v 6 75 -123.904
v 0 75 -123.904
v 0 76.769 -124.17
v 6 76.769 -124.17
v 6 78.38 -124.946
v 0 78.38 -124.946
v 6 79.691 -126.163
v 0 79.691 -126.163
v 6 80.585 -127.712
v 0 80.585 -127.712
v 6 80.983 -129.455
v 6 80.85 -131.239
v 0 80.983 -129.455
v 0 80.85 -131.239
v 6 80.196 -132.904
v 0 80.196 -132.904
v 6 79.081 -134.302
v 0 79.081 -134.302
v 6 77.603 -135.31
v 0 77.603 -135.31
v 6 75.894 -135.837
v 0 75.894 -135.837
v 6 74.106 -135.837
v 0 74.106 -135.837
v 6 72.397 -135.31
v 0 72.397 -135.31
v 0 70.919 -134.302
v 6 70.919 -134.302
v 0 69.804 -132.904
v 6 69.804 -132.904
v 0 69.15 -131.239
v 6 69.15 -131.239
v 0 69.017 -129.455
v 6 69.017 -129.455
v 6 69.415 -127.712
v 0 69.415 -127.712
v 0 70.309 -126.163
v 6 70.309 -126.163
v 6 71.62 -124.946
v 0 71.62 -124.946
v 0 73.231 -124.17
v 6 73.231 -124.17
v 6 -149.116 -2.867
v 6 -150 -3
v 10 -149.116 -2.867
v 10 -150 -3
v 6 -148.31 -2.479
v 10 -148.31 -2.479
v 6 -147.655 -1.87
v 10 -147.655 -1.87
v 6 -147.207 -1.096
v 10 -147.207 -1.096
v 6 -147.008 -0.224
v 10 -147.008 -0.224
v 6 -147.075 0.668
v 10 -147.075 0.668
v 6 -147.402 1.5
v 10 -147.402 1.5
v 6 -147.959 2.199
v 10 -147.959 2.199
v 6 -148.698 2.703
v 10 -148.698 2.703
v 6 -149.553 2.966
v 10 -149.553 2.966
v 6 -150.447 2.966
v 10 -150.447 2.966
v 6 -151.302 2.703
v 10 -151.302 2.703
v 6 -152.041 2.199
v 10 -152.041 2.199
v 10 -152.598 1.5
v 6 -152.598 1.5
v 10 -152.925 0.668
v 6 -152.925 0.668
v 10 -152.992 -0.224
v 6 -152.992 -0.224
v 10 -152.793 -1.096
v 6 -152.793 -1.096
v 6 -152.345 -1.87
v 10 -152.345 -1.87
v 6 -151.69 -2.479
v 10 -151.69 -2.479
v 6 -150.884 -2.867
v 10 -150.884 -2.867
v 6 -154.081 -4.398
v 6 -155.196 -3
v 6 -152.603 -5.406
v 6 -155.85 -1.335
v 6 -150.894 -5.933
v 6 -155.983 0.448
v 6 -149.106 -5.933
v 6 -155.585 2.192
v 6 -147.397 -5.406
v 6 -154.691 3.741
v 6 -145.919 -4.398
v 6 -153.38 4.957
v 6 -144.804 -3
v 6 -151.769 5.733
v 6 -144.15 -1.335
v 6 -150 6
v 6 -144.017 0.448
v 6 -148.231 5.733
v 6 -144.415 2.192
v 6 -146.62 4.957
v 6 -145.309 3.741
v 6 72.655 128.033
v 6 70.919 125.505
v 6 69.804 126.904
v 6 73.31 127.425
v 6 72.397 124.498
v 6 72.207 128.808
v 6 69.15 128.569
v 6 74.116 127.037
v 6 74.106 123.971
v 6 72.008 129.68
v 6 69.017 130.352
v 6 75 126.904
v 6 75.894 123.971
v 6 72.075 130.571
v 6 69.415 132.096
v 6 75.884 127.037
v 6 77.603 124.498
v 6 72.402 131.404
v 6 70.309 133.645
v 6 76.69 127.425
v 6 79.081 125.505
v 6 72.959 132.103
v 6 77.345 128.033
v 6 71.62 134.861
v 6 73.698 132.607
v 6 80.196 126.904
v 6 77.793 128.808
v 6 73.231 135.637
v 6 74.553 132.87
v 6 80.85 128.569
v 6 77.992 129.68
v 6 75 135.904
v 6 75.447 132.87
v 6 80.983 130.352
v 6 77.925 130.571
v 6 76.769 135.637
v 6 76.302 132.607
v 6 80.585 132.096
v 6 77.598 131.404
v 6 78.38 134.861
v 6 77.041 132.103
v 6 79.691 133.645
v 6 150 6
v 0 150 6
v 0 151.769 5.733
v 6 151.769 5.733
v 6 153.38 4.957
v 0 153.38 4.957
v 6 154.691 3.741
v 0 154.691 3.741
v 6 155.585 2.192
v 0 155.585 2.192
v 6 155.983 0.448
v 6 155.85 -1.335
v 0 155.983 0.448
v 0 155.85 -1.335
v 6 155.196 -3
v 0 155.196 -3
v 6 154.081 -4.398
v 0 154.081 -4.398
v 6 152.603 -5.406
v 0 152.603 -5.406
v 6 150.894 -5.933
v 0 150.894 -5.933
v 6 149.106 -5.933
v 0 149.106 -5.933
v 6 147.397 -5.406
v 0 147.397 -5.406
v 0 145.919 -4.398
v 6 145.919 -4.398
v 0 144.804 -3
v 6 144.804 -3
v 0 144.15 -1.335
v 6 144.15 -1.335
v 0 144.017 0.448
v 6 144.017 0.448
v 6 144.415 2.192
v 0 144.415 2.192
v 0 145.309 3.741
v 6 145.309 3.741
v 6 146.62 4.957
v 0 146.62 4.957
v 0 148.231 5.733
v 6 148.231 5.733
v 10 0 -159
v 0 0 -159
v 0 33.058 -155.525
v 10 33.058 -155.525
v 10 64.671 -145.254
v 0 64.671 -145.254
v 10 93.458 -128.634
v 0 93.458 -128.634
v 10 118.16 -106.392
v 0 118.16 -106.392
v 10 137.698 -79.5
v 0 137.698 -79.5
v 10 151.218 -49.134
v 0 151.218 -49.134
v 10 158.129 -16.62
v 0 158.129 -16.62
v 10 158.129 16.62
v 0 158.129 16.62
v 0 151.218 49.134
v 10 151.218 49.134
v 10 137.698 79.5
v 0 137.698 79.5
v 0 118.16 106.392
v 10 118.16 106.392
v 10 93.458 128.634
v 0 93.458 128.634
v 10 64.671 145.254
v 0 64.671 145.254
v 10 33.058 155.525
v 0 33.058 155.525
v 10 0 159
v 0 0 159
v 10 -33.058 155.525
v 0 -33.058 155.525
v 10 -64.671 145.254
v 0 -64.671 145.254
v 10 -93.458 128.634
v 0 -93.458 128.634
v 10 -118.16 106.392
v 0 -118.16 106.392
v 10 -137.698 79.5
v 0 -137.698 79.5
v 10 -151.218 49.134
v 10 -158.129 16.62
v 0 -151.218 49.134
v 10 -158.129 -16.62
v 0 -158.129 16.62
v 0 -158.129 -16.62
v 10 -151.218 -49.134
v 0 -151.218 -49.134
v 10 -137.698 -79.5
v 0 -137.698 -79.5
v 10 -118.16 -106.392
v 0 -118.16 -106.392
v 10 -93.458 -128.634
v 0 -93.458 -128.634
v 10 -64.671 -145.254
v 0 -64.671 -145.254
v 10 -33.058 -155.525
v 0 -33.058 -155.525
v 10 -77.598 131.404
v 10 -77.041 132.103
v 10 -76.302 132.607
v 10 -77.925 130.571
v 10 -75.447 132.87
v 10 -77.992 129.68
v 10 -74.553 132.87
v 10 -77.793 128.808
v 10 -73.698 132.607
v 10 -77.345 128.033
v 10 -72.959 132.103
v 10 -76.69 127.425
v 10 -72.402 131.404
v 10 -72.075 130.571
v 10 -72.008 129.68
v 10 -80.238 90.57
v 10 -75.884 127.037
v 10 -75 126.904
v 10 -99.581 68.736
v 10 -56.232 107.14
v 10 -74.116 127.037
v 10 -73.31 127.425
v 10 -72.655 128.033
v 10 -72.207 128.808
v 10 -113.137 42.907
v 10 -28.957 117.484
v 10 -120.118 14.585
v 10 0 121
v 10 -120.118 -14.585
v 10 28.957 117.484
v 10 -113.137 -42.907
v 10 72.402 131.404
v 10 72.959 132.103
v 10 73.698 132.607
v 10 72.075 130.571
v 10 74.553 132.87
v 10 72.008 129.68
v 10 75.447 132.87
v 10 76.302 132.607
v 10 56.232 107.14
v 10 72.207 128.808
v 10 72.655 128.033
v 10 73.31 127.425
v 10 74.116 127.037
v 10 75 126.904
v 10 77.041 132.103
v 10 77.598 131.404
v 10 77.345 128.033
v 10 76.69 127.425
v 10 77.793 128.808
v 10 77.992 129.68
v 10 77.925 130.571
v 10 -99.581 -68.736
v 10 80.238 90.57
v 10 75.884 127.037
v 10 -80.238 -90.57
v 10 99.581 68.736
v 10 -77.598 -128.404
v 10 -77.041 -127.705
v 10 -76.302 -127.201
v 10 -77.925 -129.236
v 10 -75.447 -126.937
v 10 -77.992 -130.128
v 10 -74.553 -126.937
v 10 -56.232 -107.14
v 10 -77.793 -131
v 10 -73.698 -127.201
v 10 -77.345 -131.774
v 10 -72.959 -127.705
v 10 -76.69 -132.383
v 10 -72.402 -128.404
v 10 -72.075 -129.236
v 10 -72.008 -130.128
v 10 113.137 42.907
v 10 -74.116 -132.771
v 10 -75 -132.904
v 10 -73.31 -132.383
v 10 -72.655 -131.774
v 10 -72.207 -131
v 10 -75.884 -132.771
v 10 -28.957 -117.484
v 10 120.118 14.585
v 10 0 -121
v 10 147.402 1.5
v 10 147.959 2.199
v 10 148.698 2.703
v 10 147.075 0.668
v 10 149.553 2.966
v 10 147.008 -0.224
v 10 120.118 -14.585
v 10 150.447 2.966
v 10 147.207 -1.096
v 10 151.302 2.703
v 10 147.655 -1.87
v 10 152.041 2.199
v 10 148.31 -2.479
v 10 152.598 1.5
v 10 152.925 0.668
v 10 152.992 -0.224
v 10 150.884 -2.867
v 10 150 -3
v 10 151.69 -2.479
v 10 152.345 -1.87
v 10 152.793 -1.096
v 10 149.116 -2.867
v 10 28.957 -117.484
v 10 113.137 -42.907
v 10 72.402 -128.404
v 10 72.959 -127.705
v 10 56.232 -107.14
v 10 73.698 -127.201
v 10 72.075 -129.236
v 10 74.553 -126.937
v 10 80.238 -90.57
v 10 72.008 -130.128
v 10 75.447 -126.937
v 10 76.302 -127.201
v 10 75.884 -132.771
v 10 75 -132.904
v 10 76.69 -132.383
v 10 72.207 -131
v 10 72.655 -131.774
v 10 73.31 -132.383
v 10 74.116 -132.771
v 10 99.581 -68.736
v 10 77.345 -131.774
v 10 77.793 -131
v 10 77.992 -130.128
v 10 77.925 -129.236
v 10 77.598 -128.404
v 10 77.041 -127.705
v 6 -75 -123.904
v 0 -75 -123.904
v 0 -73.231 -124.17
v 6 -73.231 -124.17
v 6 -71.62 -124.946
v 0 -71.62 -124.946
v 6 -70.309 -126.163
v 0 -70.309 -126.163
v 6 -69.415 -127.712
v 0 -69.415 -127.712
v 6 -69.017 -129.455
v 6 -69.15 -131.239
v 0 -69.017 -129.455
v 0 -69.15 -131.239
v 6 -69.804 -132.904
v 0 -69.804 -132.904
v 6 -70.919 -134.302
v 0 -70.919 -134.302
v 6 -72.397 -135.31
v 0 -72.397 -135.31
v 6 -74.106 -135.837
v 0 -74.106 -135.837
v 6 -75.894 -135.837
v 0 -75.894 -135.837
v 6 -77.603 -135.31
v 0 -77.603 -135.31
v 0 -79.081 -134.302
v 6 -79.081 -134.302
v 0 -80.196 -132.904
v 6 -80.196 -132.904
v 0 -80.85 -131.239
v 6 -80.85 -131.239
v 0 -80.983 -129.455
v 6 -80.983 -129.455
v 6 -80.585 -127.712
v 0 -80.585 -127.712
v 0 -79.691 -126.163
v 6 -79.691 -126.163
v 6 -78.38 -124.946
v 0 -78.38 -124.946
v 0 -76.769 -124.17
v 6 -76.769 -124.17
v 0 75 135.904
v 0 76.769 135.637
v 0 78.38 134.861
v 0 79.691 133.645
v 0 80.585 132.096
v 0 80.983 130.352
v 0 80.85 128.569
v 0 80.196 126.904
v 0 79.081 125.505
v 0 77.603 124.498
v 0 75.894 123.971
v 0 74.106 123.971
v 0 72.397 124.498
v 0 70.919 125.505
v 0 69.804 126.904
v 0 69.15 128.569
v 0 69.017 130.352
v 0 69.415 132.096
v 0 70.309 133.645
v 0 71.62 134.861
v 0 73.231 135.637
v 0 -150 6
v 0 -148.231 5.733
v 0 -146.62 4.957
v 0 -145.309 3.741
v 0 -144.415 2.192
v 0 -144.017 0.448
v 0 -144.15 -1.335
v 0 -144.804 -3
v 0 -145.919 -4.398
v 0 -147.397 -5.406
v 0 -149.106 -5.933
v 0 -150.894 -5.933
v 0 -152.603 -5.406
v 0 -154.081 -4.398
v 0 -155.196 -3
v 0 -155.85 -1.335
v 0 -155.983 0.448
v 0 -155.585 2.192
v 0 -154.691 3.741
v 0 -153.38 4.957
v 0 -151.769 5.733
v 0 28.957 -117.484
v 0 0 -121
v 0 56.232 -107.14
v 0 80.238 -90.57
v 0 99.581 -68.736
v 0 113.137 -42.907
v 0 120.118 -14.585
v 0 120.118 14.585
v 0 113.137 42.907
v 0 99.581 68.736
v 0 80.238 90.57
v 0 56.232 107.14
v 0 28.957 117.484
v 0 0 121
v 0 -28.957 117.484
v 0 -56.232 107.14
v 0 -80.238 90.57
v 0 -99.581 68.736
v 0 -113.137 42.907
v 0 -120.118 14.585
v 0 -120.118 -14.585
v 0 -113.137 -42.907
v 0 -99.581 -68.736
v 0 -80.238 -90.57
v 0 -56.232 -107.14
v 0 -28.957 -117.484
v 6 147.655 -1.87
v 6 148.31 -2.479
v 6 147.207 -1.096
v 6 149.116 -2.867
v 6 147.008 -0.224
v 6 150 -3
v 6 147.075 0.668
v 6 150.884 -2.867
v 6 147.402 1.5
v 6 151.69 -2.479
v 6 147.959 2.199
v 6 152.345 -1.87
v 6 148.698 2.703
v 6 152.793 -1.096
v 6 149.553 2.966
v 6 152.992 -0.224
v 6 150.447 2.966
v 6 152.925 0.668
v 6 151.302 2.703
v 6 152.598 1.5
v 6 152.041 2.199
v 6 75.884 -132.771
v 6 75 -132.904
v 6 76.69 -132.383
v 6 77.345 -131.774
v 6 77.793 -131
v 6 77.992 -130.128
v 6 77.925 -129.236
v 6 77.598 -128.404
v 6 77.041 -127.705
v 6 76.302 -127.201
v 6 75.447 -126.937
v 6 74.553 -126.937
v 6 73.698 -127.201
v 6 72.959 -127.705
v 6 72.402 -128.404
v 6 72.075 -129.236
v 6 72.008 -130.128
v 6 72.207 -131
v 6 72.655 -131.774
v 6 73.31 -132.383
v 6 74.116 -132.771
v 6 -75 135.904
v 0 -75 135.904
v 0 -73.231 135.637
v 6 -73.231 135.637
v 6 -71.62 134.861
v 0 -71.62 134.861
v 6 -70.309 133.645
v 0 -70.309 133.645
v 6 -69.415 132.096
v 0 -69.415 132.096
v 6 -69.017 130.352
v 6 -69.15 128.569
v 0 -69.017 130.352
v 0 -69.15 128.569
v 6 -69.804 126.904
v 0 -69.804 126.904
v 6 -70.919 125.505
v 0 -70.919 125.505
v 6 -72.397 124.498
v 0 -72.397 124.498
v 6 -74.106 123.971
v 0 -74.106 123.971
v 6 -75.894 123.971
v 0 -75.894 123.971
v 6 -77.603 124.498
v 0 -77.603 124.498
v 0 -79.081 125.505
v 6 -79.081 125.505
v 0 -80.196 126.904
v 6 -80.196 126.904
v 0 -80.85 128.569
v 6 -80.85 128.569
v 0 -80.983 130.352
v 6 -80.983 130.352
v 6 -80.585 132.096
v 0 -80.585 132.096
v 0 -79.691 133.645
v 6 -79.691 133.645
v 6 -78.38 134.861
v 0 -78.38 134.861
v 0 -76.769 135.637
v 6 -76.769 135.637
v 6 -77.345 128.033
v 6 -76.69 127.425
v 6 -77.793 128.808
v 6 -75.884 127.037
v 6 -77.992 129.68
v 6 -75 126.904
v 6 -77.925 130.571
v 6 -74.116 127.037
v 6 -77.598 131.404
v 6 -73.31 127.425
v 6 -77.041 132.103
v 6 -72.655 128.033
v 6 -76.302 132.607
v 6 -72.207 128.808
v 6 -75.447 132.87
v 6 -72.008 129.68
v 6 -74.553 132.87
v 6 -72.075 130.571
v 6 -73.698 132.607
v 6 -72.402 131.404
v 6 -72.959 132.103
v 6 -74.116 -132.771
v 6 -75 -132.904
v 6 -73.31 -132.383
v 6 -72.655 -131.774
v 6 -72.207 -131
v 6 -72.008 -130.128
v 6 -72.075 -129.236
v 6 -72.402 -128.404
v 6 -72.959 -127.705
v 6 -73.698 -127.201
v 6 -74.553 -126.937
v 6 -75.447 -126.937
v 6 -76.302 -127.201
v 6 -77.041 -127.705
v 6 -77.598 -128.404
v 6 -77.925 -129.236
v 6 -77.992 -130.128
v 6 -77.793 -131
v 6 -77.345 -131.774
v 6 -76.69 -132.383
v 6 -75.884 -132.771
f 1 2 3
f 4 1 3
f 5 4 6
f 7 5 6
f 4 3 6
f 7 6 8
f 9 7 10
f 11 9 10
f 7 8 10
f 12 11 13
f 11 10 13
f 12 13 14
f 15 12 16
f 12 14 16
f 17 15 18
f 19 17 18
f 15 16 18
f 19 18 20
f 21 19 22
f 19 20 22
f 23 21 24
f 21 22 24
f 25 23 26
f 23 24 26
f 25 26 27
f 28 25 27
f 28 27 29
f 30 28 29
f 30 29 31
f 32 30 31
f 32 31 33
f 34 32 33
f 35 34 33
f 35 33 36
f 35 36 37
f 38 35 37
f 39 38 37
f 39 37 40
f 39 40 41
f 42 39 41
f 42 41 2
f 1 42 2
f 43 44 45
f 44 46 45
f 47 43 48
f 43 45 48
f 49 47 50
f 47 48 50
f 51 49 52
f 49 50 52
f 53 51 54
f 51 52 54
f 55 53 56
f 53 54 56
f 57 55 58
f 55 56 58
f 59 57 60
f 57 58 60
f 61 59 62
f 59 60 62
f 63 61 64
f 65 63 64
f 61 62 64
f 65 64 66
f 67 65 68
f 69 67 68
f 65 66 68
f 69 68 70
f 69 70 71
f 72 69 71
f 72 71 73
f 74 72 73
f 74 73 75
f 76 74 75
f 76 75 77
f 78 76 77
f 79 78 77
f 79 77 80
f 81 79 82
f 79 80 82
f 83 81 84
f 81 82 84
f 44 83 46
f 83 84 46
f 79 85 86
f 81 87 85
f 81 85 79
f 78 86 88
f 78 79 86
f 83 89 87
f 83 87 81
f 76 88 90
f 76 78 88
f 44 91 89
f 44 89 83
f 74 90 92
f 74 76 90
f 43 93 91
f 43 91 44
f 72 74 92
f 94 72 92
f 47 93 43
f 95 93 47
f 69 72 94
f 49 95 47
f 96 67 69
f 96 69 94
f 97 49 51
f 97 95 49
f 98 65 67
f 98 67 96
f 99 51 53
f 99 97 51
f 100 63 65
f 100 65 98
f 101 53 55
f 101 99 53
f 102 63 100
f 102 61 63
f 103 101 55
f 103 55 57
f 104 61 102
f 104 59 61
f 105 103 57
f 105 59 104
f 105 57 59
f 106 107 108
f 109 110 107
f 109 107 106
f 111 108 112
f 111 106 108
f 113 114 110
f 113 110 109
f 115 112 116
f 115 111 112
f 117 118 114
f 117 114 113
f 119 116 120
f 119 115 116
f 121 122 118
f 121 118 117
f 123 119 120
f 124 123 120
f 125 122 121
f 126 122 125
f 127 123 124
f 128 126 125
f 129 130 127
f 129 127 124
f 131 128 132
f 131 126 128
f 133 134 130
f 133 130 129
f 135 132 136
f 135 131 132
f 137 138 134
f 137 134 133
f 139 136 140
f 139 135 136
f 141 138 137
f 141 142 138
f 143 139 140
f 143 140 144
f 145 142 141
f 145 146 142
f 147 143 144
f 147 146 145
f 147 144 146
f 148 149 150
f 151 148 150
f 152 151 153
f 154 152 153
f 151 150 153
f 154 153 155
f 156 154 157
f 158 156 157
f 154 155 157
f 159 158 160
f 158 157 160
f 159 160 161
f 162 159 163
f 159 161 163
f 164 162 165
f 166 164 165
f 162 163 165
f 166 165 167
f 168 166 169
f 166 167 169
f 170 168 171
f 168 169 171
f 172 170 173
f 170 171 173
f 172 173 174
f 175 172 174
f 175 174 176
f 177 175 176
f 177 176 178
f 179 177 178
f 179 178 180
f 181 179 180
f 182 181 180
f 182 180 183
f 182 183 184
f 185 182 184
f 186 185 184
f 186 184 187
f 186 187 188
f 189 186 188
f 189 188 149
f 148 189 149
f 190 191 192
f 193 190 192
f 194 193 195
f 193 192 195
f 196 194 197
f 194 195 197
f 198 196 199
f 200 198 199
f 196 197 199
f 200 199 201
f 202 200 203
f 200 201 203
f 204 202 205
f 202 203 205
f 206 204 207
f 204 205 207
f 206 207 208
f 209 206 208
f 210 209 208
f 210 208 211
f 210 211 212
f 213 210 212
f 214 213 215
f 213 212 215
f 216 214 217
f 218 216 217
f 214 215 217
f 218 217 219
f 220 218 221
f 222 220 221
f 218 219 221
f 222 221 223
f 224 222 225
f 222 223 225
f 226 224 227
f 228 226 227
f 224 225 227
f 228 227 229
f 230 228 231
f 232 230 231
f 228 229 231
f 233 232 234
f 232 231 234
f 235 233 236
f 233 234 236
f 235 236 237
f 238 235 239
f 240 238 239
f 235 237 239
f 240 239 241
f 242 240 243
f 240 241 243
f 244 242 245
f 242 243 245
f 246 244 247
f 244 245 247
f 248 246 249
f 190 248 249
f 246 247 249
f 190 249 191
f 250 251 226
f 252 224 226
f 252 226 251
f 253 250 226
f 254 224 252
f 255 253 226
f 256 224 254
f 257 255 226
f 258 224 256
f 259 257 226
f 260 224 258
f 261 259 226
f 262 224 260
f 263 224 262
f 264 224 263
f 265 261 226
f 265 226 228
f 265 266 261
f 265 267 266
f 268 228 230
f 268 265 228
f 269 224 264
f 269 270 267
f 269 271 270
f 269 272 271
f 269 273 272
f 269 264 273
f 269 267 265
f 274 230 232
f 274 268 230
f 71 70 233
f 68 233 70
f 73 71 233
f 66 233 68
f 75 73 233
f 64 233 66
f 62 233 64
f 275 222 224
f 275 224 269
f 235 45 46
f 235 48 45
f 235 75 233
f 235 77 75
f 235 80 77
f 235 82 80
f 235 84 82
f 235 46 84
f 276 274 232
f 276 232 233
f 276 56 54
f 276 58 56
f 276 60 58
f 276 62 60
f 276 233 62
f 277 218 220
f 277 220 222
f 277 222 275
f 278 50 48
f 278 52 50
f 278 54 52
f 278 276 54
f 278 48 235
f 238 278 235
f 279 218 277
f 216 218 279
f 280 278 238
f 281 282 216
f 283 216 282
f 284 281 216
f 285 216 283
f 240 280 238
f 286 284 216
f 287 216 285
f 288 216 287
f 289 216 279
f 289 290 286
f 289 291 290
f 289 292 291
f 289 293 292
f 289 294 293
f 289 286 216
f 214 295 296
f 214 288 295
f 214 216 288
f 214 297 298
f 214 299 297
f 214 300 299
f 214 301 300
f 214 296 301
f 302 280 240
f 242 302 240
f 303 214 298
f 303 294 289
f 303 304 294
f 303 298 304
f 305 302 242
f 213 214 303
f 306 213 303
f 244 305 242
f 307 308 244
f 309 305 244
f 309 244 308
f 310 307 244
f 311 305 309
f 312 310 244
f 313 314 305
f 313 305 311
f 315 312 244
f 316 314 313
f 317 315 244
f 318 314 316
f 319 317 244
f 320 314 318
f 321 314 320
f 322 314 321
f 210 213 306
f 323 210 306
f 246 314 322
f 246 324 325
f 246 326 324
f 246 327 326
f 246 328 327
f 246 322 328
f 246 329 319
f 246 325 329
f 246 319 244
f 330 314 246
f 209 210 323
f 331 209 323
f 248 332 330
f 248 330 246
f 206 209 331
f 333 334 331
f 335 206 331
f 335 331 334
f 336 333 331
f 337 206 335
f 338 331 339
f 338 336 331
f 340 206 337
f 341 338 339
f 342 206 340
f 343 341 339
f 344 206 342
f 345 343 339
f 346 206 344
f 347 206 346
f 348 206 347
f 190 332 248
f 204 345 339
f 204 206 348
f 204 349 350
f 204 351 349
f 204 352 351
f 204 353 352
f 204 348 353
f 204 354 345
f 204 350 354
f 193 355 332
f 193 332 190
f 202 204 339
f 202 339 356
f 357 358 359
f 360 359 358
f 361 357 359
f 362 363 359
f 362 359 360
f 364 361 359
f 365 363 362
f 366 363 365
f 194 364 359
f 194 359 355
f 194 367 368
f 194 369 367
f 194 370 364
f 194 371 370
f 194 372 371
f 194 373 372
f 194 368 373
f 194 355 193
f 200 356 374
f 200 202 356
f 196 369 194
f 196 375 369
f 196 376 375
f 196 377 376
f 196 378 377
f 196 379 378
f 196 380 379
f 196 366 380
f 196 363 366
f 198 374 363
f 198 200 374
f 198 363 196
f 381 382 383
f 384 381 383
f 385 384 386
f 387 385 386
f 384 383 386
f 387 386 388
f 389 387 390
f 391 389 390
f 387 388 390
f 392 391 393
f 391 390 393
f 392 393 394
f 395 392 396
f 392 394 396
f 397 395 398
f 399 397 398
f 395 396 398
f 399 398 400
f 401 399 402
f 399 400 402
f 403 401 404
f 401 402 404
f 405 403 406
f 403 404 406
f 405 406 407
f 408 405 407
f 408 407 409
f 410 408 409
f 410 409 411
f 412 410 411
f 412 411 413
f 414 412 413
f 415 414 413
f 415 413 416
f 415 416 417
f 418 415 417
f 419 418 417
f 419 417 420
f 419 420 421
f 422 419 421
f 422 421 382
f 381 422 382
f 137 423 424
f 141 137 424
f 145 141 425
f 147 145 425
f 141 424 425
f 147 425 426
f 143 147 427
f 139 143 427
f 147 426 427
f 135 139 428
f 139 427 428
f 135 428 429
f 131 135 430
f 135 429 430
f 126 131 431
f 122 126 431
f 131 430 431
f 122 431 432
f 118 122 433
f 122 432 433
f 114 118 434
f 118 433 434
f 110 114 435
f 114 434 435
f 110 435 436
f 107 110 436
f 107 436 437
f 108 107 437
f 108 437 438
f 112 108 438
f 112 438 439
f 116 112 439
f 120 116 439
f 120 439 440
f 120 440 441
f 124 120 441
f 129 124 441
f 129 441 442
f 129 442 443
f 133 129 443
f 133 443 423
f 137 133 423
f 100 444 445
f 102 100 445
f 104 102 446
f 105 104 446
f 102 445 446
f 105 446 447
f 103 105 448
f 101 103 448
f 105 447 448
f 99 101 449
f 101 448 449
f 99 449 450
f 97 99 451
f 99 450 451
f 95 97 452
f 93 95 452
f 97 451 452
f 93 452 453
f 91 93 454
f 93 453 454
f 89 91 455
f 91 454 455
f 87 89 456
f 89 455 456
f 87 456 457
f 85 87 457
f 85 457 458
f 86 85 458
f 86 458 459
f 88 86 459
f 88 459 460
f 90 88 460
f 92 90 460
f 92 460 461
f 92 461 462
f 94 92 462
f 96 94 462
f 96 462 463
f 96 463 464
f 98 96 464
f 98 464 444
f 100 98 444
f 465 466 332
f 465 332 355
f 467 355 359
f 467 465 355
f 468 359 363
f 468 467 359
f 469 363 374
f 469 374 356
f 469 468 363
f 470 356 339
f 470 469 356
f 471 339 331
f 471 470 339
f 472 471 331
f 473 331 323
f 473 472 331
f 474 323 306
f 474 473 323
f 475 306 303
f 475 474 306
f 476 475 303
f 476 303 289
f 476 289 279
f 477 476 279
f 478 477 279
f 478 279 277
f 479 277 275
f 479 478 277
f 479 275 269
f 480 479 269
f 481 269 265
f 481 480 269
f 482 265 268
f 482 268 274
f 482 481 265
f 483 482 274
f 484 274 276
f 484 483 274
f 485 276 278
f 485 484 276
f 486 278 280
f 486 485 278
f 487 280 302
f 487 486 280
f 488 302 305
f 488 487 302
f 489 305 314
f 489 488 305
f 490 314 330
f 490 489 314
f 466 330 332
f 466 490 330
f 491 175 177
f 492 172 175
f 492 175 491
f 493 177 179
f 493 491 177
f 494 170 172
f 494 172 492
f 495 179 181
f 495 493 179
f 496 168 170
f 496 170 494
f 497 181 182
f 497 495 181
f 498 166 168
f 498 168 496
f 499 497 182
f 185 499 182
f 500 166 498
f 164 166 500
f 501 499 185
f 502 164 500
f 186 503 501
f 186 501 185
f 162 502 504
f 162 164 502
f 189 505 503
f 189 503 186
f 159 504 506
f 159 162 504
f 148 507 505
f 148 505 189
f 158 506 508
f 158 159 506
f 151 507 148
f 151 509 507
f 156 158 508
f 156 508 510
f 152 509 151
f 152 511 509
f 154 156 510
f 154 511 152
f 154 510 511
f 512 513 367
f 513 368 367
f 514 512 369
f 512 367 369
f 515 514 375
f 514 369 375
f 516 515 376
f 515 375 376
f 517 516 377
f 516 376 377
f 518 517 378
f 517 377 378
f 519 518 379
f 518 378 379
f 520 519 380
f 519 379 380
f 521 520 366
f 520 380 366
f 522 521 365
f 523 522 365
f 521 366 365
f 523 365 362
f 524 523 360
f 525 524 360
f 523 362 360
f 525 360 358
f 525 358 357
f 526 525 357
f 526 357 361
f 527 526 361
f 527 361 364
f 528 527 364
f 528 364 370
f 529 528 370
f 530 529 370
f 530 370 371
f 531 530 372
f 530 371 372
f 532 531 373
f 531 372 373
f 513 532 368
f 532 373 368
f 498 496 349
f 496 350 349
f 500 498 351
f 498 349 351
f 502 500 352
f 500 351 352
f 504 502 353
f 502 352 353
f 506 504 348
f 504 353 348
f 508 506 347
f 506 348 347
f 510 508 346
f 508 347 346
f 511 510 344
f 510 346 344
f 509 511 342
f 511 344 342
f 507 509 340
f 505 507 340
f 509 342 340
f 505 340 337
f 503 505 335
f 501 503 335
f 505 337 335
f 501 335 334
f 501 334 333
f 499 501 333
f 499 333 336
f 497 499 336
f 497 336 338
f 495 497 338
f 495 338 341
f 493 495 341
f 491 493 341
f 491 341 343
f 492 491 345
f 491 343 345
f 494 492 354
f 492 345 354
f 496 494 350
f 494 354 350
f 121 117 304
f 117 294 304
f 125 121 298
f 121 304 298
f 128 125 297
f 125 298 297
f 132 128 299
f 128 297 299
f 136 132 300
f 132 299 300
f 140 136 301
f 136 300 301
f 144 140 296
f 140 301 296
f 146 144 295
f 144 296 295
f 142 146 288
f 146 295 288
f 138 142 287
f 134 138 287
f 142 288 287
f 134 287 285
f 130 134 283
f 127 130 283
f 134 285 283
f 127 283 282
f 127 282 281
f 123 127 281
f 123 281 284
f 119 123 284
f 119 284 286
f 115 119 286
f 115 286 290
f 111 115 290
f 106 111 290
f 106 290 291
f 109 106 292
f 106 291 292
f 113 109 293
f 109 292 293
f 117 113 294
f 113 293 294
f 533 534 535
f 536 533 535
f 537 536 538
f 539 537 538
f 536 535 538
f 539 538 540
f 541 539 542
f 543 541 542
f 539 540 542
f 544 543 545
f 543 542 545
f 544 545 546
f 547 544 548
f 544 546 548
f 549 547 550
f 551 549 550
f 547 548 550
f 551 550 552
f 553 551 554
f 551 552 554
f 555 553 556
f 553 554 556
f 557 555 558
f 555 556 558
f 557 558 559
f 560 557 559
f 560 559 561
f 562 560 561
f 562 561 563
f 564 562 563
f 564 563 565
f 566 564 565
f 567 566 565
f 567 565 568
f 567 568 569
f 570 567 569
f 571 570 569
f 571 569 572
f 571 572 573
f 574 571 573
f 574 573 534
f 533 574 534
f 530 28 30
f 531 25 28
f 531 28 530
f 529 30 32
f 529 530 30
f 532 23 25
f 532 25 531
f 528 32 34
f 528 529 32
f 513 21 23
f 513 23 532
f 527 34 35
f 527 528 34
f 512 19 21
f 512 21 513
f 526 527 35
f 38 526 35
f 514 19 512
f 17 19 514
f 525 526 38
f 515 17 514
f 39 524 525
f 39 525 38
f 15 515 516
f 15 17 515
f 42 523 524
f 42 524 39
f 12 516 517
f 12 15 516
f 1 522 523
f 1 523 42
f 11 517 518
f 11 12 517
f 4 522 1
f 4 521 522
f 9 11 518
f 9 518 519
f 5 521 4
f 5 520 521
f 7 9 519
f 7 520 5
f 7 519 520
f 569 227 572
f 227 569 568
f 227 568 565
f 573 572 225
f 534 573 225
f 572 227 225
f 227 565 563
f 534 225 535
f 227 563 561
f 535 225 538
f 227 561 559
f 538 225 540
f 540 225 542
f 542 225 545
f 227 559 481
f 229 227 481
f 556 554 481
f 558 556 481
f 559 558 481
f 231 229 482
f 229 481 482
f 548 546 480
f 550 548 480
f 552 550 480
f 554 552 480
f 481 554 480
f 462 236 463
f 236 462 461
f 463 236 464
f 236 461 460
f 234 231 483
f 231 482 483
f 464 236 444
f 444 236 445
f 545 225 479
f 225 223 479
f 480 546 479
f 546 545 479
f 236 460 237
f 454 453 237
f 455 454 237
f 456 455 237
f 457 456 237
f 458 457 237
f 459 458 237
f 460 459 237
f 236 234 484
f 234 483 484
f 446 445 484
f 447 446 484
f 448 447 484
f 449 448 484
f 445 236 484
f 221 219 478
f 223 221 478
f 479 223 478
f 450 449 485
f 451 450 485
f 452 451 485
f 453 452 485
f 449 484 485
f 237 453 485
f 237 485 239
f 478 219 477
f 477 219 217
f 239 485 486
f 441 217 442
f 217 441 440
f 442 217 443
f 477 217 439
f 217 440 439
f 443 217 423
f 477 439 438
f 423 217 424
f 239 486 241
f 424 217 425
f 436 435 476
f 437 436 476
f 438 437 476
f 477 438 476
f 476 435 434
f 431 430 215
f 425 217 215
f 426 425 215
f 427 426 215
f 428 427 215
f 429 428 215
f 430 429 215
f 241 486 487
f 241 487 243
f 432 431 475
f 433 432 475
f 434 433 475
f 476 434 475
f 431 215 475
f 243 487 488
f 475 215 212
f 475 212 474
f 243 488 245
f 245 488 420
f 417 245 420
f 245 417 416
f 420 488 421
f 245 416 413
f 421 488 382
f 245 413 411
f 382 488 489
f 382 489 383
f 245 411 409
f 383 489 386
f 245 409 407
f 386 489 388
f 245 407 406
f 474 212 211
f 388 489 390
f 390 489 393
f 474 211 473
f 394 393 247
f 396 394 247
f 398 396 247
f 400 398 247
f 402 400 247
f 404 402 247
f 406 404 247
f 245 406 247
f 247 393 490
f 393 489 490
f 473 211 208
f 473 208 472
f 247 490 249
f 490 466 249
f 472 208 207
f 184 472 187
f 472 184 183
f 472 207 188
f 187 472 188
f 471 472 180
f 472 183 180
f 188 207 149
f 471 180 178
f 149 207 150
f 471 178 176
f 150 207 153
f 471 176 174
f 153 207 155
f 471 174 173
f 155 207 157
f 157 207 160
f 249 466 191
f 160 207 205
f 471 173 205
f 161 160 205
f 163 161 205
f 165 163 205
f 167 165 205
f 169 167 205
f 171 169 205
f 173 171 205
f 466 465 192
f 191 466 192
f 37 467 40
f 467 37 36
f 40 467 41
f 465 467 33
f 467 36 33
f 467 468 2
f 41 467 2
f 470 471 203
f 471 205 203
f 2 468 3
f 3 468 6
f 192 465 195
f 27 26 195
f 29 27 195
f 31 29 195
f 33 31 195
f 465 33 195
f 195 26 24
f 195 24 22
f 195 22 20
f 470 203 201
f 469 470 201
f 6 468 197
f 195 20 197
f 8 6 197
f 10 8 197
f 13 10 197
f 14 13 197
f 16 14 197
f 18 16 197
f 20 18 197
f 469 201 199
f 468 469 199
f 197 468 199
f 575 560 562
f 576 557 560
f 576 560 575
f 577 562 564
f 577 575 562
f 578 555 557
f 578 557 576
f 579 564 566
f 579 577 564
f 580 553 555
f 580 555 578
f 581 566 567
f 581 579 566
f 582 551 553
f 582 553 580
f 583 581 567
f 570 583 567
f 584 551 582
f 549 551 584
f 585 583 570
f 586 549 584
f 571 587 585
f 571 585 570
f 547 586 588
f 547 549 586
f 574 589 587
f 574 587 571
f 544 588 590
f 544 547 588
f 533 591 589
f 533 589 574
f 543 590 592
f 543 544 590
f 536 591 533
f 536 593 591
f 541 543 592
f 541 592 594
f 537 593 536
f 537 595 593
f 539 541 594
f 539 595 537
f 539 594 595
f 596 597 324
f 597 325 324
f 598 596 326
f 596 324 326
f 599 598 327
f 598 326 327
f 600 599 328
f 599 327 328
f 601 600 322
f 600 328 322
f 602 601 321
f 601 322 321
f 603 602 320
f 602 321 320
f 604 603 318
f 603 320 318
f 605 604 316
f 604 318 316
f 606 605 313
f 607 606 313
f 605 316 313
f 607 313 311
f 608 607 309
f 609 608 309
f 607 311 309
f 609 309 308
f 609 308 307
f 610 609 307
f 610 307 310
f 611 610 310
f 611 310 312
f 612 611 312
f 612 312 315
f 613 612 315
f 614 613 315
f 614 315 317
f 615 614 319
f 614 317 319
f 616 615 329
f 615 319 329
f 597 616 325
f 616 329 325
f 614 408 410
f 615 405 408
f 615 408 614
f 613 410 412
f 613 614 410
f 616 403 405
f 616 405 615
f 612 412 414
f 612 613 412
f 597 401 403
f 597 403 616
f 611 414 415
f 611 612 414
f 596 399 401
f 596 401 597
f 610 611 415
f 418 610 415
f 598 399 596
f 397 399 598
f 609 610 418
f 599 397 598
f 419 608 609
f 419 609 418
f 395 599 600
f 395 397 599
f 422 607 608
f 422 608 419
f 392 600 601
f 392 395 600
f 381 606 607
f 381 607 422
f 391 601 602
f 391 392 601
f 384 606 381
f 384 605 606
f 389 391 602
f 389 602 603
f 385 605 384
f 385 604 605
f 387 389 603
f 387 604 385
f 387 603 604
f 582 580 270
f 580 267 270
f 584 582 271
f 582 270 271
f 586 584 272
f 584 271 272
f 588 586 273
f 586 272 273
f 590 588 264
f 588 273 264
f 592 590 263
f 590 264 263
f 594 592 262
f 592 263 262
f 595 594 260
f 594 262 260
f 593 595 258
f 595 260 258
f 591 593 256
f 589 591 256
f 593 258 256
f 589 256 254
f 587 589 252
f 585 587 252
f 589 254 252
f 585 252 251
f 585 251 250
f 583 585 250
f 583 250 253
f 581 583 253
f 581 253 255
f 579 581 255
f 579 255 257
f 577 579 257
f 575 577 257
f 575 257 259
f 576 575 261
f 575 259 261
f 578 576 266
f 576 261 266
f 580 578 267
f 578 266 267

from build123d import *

# Parameters (mm, degrees)
SKETCH1_R                               = 159
SKETCH1_R_2                             = 121
BOSS_EXTRUDE1_DEPTH                     = 10
CBORE_FOR_M5_HEX_HEAD_BOLT2_D           = 6
CBORE_FOR_M5_HEX_HEAD_BOLT2_DEPTH       = 13
CBORE_FOR_M5_HEX_HEAD_BOLT2_CBORE_D     = 12
CBORE_FOR_M5_HEX_HEAD_BOLT2_CBORE_DEPTH = 6
CBORE_FOR_M5_HEX_HEAD_BOLT2_TIP         = 1.802581857


with BuildPart() as part:
    # Sketch1 → Boss-Extrude1 (new body)
    with BuildSketch(Plane(origin=(0, 0, 0), x_dir=(0, 0, -1), z_dir=(1, 0, 0))):
        Circle(SKETCH1_R)
        Circle(SKETCH1_R_2, mode=Mode.SUBTRACT)
    extrude(amount=BOSS_EXTRUDE1_DEPTH)

    # CBORE for M5 Hex Head Bolt2
    with Locations(Plane.ZY):
        with Locations((0, 150), (129.903810568, 75), (129.903810568, -75), (0, -150), (-129.903810568, -75), (-129.903810568, 75), (0, 0)):
            CounterBoreHole(CBORE_FOR_M5_HEX_HEAD_BOLT2_D / 2, CBORE_FOR_M5_HEX_HEAD_BOLT2_CBORE_D / 2, CBORE_FOR_M5_HEX_HEAD_BOLT2_CBORE_DEPTH, depth=CBORE_FOR_M5_HEX_HEAD_BOLT2_DEPTH)
            with Locations((0, 0, -(CBORE_FOR_M5_HEX_HEAD_BOLT2_DEPTH + CBORE_FOR_M5_HEX_HEAD_BOLT2_TIP / 2))):  # 118° drill point
                Cone(0, CBORE_FOR_M5_HEX_HEAD_BOLT2_D / 2, CBORE_FOR_M5_HEX_HEAD_BOLT2_TIP, mode=Mode.SUBTRACT)


solid = part.part
